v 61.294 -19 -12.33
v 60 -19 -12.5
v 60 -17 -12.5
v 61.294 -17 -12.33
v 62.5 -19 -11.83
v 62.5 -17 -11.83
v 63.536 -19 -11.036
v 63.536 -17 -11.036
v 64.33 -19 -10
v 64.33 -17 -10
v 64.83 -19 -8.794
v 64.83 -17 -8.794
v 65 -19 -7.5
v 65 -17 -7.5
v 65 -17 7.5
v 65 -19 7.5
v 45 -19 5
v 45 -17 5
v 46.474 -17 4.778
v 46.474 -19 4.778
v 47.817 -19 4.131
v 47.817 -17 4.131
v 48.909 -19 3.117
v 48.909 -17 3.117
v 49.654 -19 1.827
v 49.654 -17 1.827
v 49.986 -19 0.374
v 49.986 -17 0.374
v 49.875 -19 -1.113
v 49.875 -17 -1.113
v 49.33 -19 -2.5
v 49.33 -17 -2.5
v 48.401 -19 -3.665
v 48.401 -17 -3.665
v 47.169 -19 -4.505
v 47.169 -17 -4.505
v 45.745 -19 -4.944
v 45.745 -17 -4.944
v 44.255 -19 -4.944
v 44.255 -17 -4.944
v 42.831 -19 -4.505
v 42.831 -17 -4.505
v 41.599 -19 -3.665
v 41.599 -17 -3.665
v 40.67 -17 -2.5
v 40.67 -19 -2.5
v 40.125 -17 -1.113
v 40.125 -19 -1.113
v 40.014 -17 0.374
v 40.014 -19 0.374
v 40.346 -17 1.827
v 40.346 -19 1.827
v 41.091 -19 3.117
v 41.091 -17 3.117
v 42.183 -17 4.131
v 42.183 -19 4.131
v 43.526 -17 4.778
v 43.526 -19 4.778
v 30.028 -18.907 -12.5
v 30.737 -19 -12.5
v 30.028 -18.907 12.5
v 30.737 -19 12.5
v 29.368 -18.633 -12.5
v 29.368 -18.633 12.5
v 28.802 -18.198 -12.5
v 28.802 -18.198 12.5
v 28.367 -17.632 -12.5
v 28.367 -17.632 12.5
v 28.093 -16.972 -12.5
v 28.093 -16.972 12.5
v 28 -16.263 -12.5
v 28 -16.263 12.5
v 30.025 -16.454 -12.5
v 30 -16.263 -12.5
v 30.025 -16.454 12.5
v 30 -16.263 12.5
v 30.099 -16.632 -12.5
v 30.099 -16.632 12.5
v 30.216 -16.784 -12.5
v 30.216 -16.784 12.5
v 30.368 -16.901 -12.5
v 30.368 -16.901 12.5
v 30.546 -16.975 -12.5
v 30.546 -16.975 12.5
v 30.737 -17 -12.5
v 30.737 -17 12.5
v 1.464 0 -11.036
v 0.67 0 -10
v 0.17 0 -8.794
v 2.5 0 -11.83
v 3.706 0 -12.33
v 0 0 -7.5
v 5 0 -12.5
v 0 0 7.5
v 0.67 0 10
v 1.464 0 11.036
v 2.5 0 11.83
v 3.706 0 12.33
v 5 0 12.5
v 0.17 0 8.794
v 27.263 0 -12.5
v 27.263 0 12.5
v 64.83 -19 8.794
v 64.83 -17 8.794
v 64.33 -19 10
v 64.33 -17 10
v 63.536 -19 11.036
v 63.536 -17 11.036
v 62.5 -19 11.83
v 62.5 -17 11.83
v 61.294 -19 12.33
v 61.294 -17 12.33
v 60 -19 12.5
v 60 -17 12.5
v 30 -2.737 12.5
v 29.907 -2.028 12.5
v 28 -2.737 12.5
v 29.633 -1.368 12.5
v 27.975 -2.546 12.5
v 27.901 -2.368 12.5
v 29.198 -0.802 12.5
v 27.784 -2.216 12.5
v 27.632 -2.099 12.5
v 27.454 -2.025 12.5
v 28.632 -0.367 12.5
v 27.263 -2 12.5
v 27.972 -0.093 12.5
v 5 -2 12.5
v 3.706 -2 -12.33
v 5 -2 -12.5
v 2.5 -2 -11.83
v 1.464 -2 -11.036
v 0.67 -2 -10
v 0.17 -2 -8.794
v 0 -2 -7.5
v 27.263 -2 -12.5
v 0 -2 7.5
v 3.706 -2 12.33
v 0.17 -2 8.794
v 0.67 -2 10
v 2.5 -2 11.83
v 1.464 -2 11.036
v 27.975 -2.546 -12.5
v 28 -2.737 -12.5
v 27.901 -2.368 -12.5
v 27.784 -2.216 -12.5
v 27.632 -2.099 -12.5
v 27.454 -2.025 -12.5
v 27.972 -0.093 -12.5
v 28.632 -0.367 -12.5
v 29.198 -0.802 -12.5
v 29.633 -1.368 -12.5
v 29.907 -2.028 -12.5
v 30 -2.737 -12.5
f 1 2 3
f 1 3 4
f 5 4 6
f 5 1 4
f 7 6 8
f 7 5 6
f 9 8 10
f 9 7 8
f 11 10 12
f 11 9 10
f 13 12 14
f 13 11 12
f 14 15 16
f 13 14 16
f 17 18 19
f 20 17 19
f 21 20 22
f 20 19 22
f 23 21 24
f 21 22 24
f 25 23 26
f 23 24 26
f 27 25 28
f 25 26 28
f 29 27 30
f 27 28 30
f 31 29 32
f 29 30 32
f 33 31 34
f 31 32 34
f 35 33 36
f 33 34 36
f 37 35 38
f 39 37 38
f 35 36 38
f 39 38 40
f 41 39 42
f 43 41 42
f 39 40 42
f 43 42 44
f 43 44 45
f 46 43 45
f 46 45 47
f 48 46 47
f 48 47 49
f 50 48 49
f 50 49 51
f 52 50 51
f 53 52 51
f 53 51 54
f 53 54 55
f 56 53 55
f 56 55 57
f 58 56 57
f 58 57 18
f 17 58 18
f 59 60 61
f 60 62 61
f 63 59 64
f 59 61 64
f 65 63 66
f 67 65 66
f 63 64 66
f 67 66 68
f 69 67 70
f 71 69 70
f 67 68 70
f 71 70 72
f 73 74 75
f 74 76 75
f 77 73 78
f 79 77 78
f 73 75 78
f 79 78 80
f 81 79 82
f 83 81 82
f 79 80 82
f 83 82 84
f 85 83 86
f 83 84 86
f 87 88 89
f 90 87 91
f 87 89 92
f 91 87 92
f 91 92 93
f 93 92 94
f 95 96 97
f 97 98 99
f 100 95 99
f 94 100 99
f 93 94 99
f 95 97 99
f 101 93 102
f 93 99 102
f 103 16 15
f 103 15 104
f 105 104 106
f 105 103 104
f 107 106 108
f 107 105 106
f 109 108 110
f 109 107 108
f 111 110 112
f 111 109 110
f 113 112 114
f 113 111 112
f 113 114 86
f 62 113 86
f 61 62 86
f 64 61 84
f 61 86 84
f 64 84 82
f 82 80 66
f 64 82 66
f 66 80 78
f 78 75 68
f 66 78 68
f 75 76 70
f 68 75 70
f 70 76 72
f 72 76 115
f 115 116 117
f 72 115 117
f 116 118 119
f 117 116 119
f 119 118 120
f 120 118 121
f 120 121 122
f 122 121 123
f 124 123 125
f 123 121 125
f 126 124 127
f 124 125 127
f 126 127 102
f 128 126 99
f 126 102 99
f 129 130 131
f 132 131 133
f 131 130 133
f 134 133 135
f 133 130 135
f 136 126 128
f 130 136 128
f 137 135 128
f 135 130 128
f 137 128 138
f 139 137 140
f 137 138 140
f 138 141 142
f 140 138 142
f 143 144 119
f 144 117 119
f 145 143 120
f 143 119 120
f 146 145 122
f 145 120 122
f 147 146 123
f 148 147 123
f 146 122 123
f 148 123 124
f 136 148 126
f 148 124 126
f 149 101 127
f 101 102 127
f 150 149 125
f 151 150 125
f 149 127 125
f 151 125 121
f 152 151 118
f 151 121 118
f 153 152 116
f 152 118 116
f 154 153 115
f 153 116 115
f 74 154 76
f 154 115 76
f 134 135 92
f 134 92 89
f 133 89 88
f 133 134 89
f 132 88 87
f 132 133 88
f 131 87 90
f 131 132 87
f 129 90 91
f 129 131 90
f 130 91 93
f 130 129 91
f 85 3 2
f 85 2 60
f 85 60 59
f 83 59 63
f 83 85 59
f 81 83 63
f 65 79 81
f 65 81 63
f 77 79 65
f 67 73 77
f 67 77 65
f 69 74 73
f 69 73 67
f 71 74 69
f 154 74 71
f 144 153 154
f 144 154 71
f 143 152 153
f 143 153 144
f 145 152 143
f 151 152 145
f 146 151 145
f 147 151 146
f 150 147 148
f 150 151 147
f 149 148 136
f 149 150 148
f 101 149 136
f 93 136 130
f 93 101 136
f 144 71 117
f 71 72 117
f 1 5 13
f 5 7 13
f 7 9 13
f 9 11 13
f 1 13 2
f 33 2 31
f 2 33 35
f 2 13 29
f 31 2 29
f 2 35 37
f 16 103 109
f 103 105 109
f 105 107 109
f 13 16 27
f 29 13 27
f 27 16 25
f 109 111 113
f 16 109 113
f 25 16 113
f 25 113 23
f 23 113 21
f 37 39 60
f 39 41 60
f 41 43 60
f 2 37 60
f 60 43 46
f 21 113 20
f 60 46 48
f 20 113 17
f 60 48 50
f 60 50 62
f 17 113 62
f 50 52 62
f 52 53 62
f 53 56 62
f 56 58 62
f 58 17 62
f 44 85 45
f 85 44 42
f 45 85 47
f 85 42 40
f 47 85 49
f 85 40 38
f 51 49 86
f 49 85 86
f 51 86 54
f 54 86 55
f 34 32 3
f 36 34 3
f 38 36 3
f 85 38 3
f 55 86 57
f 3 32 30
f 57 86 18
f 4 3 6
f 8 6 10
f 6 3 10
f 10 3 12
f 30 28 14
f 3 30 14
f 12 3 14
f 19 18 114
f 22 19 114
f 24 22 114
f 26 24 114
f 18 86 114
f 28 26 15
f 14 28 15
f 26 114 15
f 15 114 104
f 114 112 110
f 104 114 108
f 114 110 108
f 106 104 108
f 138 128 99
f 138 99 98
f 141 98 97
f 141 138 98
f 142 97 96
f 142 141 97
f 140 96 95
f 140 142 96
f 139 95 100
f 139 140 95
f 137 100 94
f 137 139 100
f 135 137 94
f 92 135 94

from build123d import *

# Parameters (mm, degrees)
TABAN_FLAN_1_DEPTH    = 12.5
K_ELERI_START         = -19
K_ELERI_K_R1_DEPTH    = 19
IZIM2_R               = 5
KES_EKSTR_ZYON1_DEPTH = 10


# Read off the part's stored shape, not the designer's step: Köşeleri kır1
# Sheet-metal steps are written as plain solids
with BuildPart() as part:
    # Çizim1 → Taban-Flanş1 (new, symmetric)
    with BuildSketch(Plane.XY):
        with BuildLine():
            Line((0, 0), (27.2634, 0))
            ThreePointArc((27.2634, 0), (29.198468417, -0.801531583), (30, -2.7366))
            Line((30, -2.7366), (30, -16.2634))
            ThreePointArc((30, -16.2634), (30.215745145, -16.784254855), (30.7366, -17))
            Line((30.7366, -17), (65, -17))
            Line((65, -17), (65, -19))
            Line((65, -19), (30.7366, -19))
            ThreePointArc((30.7366, -19), (28.801531583, -18.198468417), (28, -16.2634))
            Line((28, -16.2634), (28, -2.7366))
            ThreePointArc((28, -2.7366), (27.784254855, -2.215745145), (27.2634, -2))
            Line((27.2634, -2), (0, -2))
            Line((0, -2), (0, 0))
        make_face()
    extrude(amount=TABAN_FLAN_1_DEPTH, both=True)

    # Köşeleri kır1 outline → Köşeleri kır1 (cut)
    with BuildSketch(Plane(origin=(0, 0, 0), x_dir=(1, 0, 0), z_dir=(0, 1, 0)).offset(K_ELERI_START)):
        with BuildLine():
            Line((0, -12.5), (5, -12.5))
            ThreePointArc((5, -12.5), (1.464466094, -11.035533906), (0, -7.5))
            Line((0, -7.5), (0, -12.5))
        make_face()
        with BuildLine():
            Line((0, 12.5), (0, 7.5))
            ThreePointArc((0, 7.5), (1.464466094, 11.035533906), (5, 12.5))
            Line((5, 12.5), (0, 12.5))
        make_face()
        with BuildLine():
            Line((65, -12.5), (65, -7.5))
            ThreePointArc((65, -7.5), (63.535533906, -11.035533906), (60, -12.5))
            Line((60, -12.5), (65, -12.5))
        make_face()
        with BuildLine():
            ThreePointArc((60, 12.5), (63.535533906, 11.035533906), (65, 7.5))
            Line((65, 7.5), (65, 12.5))
            Line((65, 12.5), (60, 12.5))
        make_face()
    extrude(amount=K_ELERI_K_R1_DEPTH, mode=Mode.SUBTRACT)

    # Çizim2 → Kes-Ekstrüzyon1 (cut)
    with BuildSketch(Plane(origin=(0, -17, 0), x_dir=(1, 0, 0), z_dir=(0, 1, 0))):
        with Locations(Location((45, 0, 0), (0, 0, 270))):
            Circle(IZIM2_R)
    extrude(amount=-KES_EKSTR_ZYON1_DEPTH, mode=Mode.SUBTRACT)


solid = part.part
